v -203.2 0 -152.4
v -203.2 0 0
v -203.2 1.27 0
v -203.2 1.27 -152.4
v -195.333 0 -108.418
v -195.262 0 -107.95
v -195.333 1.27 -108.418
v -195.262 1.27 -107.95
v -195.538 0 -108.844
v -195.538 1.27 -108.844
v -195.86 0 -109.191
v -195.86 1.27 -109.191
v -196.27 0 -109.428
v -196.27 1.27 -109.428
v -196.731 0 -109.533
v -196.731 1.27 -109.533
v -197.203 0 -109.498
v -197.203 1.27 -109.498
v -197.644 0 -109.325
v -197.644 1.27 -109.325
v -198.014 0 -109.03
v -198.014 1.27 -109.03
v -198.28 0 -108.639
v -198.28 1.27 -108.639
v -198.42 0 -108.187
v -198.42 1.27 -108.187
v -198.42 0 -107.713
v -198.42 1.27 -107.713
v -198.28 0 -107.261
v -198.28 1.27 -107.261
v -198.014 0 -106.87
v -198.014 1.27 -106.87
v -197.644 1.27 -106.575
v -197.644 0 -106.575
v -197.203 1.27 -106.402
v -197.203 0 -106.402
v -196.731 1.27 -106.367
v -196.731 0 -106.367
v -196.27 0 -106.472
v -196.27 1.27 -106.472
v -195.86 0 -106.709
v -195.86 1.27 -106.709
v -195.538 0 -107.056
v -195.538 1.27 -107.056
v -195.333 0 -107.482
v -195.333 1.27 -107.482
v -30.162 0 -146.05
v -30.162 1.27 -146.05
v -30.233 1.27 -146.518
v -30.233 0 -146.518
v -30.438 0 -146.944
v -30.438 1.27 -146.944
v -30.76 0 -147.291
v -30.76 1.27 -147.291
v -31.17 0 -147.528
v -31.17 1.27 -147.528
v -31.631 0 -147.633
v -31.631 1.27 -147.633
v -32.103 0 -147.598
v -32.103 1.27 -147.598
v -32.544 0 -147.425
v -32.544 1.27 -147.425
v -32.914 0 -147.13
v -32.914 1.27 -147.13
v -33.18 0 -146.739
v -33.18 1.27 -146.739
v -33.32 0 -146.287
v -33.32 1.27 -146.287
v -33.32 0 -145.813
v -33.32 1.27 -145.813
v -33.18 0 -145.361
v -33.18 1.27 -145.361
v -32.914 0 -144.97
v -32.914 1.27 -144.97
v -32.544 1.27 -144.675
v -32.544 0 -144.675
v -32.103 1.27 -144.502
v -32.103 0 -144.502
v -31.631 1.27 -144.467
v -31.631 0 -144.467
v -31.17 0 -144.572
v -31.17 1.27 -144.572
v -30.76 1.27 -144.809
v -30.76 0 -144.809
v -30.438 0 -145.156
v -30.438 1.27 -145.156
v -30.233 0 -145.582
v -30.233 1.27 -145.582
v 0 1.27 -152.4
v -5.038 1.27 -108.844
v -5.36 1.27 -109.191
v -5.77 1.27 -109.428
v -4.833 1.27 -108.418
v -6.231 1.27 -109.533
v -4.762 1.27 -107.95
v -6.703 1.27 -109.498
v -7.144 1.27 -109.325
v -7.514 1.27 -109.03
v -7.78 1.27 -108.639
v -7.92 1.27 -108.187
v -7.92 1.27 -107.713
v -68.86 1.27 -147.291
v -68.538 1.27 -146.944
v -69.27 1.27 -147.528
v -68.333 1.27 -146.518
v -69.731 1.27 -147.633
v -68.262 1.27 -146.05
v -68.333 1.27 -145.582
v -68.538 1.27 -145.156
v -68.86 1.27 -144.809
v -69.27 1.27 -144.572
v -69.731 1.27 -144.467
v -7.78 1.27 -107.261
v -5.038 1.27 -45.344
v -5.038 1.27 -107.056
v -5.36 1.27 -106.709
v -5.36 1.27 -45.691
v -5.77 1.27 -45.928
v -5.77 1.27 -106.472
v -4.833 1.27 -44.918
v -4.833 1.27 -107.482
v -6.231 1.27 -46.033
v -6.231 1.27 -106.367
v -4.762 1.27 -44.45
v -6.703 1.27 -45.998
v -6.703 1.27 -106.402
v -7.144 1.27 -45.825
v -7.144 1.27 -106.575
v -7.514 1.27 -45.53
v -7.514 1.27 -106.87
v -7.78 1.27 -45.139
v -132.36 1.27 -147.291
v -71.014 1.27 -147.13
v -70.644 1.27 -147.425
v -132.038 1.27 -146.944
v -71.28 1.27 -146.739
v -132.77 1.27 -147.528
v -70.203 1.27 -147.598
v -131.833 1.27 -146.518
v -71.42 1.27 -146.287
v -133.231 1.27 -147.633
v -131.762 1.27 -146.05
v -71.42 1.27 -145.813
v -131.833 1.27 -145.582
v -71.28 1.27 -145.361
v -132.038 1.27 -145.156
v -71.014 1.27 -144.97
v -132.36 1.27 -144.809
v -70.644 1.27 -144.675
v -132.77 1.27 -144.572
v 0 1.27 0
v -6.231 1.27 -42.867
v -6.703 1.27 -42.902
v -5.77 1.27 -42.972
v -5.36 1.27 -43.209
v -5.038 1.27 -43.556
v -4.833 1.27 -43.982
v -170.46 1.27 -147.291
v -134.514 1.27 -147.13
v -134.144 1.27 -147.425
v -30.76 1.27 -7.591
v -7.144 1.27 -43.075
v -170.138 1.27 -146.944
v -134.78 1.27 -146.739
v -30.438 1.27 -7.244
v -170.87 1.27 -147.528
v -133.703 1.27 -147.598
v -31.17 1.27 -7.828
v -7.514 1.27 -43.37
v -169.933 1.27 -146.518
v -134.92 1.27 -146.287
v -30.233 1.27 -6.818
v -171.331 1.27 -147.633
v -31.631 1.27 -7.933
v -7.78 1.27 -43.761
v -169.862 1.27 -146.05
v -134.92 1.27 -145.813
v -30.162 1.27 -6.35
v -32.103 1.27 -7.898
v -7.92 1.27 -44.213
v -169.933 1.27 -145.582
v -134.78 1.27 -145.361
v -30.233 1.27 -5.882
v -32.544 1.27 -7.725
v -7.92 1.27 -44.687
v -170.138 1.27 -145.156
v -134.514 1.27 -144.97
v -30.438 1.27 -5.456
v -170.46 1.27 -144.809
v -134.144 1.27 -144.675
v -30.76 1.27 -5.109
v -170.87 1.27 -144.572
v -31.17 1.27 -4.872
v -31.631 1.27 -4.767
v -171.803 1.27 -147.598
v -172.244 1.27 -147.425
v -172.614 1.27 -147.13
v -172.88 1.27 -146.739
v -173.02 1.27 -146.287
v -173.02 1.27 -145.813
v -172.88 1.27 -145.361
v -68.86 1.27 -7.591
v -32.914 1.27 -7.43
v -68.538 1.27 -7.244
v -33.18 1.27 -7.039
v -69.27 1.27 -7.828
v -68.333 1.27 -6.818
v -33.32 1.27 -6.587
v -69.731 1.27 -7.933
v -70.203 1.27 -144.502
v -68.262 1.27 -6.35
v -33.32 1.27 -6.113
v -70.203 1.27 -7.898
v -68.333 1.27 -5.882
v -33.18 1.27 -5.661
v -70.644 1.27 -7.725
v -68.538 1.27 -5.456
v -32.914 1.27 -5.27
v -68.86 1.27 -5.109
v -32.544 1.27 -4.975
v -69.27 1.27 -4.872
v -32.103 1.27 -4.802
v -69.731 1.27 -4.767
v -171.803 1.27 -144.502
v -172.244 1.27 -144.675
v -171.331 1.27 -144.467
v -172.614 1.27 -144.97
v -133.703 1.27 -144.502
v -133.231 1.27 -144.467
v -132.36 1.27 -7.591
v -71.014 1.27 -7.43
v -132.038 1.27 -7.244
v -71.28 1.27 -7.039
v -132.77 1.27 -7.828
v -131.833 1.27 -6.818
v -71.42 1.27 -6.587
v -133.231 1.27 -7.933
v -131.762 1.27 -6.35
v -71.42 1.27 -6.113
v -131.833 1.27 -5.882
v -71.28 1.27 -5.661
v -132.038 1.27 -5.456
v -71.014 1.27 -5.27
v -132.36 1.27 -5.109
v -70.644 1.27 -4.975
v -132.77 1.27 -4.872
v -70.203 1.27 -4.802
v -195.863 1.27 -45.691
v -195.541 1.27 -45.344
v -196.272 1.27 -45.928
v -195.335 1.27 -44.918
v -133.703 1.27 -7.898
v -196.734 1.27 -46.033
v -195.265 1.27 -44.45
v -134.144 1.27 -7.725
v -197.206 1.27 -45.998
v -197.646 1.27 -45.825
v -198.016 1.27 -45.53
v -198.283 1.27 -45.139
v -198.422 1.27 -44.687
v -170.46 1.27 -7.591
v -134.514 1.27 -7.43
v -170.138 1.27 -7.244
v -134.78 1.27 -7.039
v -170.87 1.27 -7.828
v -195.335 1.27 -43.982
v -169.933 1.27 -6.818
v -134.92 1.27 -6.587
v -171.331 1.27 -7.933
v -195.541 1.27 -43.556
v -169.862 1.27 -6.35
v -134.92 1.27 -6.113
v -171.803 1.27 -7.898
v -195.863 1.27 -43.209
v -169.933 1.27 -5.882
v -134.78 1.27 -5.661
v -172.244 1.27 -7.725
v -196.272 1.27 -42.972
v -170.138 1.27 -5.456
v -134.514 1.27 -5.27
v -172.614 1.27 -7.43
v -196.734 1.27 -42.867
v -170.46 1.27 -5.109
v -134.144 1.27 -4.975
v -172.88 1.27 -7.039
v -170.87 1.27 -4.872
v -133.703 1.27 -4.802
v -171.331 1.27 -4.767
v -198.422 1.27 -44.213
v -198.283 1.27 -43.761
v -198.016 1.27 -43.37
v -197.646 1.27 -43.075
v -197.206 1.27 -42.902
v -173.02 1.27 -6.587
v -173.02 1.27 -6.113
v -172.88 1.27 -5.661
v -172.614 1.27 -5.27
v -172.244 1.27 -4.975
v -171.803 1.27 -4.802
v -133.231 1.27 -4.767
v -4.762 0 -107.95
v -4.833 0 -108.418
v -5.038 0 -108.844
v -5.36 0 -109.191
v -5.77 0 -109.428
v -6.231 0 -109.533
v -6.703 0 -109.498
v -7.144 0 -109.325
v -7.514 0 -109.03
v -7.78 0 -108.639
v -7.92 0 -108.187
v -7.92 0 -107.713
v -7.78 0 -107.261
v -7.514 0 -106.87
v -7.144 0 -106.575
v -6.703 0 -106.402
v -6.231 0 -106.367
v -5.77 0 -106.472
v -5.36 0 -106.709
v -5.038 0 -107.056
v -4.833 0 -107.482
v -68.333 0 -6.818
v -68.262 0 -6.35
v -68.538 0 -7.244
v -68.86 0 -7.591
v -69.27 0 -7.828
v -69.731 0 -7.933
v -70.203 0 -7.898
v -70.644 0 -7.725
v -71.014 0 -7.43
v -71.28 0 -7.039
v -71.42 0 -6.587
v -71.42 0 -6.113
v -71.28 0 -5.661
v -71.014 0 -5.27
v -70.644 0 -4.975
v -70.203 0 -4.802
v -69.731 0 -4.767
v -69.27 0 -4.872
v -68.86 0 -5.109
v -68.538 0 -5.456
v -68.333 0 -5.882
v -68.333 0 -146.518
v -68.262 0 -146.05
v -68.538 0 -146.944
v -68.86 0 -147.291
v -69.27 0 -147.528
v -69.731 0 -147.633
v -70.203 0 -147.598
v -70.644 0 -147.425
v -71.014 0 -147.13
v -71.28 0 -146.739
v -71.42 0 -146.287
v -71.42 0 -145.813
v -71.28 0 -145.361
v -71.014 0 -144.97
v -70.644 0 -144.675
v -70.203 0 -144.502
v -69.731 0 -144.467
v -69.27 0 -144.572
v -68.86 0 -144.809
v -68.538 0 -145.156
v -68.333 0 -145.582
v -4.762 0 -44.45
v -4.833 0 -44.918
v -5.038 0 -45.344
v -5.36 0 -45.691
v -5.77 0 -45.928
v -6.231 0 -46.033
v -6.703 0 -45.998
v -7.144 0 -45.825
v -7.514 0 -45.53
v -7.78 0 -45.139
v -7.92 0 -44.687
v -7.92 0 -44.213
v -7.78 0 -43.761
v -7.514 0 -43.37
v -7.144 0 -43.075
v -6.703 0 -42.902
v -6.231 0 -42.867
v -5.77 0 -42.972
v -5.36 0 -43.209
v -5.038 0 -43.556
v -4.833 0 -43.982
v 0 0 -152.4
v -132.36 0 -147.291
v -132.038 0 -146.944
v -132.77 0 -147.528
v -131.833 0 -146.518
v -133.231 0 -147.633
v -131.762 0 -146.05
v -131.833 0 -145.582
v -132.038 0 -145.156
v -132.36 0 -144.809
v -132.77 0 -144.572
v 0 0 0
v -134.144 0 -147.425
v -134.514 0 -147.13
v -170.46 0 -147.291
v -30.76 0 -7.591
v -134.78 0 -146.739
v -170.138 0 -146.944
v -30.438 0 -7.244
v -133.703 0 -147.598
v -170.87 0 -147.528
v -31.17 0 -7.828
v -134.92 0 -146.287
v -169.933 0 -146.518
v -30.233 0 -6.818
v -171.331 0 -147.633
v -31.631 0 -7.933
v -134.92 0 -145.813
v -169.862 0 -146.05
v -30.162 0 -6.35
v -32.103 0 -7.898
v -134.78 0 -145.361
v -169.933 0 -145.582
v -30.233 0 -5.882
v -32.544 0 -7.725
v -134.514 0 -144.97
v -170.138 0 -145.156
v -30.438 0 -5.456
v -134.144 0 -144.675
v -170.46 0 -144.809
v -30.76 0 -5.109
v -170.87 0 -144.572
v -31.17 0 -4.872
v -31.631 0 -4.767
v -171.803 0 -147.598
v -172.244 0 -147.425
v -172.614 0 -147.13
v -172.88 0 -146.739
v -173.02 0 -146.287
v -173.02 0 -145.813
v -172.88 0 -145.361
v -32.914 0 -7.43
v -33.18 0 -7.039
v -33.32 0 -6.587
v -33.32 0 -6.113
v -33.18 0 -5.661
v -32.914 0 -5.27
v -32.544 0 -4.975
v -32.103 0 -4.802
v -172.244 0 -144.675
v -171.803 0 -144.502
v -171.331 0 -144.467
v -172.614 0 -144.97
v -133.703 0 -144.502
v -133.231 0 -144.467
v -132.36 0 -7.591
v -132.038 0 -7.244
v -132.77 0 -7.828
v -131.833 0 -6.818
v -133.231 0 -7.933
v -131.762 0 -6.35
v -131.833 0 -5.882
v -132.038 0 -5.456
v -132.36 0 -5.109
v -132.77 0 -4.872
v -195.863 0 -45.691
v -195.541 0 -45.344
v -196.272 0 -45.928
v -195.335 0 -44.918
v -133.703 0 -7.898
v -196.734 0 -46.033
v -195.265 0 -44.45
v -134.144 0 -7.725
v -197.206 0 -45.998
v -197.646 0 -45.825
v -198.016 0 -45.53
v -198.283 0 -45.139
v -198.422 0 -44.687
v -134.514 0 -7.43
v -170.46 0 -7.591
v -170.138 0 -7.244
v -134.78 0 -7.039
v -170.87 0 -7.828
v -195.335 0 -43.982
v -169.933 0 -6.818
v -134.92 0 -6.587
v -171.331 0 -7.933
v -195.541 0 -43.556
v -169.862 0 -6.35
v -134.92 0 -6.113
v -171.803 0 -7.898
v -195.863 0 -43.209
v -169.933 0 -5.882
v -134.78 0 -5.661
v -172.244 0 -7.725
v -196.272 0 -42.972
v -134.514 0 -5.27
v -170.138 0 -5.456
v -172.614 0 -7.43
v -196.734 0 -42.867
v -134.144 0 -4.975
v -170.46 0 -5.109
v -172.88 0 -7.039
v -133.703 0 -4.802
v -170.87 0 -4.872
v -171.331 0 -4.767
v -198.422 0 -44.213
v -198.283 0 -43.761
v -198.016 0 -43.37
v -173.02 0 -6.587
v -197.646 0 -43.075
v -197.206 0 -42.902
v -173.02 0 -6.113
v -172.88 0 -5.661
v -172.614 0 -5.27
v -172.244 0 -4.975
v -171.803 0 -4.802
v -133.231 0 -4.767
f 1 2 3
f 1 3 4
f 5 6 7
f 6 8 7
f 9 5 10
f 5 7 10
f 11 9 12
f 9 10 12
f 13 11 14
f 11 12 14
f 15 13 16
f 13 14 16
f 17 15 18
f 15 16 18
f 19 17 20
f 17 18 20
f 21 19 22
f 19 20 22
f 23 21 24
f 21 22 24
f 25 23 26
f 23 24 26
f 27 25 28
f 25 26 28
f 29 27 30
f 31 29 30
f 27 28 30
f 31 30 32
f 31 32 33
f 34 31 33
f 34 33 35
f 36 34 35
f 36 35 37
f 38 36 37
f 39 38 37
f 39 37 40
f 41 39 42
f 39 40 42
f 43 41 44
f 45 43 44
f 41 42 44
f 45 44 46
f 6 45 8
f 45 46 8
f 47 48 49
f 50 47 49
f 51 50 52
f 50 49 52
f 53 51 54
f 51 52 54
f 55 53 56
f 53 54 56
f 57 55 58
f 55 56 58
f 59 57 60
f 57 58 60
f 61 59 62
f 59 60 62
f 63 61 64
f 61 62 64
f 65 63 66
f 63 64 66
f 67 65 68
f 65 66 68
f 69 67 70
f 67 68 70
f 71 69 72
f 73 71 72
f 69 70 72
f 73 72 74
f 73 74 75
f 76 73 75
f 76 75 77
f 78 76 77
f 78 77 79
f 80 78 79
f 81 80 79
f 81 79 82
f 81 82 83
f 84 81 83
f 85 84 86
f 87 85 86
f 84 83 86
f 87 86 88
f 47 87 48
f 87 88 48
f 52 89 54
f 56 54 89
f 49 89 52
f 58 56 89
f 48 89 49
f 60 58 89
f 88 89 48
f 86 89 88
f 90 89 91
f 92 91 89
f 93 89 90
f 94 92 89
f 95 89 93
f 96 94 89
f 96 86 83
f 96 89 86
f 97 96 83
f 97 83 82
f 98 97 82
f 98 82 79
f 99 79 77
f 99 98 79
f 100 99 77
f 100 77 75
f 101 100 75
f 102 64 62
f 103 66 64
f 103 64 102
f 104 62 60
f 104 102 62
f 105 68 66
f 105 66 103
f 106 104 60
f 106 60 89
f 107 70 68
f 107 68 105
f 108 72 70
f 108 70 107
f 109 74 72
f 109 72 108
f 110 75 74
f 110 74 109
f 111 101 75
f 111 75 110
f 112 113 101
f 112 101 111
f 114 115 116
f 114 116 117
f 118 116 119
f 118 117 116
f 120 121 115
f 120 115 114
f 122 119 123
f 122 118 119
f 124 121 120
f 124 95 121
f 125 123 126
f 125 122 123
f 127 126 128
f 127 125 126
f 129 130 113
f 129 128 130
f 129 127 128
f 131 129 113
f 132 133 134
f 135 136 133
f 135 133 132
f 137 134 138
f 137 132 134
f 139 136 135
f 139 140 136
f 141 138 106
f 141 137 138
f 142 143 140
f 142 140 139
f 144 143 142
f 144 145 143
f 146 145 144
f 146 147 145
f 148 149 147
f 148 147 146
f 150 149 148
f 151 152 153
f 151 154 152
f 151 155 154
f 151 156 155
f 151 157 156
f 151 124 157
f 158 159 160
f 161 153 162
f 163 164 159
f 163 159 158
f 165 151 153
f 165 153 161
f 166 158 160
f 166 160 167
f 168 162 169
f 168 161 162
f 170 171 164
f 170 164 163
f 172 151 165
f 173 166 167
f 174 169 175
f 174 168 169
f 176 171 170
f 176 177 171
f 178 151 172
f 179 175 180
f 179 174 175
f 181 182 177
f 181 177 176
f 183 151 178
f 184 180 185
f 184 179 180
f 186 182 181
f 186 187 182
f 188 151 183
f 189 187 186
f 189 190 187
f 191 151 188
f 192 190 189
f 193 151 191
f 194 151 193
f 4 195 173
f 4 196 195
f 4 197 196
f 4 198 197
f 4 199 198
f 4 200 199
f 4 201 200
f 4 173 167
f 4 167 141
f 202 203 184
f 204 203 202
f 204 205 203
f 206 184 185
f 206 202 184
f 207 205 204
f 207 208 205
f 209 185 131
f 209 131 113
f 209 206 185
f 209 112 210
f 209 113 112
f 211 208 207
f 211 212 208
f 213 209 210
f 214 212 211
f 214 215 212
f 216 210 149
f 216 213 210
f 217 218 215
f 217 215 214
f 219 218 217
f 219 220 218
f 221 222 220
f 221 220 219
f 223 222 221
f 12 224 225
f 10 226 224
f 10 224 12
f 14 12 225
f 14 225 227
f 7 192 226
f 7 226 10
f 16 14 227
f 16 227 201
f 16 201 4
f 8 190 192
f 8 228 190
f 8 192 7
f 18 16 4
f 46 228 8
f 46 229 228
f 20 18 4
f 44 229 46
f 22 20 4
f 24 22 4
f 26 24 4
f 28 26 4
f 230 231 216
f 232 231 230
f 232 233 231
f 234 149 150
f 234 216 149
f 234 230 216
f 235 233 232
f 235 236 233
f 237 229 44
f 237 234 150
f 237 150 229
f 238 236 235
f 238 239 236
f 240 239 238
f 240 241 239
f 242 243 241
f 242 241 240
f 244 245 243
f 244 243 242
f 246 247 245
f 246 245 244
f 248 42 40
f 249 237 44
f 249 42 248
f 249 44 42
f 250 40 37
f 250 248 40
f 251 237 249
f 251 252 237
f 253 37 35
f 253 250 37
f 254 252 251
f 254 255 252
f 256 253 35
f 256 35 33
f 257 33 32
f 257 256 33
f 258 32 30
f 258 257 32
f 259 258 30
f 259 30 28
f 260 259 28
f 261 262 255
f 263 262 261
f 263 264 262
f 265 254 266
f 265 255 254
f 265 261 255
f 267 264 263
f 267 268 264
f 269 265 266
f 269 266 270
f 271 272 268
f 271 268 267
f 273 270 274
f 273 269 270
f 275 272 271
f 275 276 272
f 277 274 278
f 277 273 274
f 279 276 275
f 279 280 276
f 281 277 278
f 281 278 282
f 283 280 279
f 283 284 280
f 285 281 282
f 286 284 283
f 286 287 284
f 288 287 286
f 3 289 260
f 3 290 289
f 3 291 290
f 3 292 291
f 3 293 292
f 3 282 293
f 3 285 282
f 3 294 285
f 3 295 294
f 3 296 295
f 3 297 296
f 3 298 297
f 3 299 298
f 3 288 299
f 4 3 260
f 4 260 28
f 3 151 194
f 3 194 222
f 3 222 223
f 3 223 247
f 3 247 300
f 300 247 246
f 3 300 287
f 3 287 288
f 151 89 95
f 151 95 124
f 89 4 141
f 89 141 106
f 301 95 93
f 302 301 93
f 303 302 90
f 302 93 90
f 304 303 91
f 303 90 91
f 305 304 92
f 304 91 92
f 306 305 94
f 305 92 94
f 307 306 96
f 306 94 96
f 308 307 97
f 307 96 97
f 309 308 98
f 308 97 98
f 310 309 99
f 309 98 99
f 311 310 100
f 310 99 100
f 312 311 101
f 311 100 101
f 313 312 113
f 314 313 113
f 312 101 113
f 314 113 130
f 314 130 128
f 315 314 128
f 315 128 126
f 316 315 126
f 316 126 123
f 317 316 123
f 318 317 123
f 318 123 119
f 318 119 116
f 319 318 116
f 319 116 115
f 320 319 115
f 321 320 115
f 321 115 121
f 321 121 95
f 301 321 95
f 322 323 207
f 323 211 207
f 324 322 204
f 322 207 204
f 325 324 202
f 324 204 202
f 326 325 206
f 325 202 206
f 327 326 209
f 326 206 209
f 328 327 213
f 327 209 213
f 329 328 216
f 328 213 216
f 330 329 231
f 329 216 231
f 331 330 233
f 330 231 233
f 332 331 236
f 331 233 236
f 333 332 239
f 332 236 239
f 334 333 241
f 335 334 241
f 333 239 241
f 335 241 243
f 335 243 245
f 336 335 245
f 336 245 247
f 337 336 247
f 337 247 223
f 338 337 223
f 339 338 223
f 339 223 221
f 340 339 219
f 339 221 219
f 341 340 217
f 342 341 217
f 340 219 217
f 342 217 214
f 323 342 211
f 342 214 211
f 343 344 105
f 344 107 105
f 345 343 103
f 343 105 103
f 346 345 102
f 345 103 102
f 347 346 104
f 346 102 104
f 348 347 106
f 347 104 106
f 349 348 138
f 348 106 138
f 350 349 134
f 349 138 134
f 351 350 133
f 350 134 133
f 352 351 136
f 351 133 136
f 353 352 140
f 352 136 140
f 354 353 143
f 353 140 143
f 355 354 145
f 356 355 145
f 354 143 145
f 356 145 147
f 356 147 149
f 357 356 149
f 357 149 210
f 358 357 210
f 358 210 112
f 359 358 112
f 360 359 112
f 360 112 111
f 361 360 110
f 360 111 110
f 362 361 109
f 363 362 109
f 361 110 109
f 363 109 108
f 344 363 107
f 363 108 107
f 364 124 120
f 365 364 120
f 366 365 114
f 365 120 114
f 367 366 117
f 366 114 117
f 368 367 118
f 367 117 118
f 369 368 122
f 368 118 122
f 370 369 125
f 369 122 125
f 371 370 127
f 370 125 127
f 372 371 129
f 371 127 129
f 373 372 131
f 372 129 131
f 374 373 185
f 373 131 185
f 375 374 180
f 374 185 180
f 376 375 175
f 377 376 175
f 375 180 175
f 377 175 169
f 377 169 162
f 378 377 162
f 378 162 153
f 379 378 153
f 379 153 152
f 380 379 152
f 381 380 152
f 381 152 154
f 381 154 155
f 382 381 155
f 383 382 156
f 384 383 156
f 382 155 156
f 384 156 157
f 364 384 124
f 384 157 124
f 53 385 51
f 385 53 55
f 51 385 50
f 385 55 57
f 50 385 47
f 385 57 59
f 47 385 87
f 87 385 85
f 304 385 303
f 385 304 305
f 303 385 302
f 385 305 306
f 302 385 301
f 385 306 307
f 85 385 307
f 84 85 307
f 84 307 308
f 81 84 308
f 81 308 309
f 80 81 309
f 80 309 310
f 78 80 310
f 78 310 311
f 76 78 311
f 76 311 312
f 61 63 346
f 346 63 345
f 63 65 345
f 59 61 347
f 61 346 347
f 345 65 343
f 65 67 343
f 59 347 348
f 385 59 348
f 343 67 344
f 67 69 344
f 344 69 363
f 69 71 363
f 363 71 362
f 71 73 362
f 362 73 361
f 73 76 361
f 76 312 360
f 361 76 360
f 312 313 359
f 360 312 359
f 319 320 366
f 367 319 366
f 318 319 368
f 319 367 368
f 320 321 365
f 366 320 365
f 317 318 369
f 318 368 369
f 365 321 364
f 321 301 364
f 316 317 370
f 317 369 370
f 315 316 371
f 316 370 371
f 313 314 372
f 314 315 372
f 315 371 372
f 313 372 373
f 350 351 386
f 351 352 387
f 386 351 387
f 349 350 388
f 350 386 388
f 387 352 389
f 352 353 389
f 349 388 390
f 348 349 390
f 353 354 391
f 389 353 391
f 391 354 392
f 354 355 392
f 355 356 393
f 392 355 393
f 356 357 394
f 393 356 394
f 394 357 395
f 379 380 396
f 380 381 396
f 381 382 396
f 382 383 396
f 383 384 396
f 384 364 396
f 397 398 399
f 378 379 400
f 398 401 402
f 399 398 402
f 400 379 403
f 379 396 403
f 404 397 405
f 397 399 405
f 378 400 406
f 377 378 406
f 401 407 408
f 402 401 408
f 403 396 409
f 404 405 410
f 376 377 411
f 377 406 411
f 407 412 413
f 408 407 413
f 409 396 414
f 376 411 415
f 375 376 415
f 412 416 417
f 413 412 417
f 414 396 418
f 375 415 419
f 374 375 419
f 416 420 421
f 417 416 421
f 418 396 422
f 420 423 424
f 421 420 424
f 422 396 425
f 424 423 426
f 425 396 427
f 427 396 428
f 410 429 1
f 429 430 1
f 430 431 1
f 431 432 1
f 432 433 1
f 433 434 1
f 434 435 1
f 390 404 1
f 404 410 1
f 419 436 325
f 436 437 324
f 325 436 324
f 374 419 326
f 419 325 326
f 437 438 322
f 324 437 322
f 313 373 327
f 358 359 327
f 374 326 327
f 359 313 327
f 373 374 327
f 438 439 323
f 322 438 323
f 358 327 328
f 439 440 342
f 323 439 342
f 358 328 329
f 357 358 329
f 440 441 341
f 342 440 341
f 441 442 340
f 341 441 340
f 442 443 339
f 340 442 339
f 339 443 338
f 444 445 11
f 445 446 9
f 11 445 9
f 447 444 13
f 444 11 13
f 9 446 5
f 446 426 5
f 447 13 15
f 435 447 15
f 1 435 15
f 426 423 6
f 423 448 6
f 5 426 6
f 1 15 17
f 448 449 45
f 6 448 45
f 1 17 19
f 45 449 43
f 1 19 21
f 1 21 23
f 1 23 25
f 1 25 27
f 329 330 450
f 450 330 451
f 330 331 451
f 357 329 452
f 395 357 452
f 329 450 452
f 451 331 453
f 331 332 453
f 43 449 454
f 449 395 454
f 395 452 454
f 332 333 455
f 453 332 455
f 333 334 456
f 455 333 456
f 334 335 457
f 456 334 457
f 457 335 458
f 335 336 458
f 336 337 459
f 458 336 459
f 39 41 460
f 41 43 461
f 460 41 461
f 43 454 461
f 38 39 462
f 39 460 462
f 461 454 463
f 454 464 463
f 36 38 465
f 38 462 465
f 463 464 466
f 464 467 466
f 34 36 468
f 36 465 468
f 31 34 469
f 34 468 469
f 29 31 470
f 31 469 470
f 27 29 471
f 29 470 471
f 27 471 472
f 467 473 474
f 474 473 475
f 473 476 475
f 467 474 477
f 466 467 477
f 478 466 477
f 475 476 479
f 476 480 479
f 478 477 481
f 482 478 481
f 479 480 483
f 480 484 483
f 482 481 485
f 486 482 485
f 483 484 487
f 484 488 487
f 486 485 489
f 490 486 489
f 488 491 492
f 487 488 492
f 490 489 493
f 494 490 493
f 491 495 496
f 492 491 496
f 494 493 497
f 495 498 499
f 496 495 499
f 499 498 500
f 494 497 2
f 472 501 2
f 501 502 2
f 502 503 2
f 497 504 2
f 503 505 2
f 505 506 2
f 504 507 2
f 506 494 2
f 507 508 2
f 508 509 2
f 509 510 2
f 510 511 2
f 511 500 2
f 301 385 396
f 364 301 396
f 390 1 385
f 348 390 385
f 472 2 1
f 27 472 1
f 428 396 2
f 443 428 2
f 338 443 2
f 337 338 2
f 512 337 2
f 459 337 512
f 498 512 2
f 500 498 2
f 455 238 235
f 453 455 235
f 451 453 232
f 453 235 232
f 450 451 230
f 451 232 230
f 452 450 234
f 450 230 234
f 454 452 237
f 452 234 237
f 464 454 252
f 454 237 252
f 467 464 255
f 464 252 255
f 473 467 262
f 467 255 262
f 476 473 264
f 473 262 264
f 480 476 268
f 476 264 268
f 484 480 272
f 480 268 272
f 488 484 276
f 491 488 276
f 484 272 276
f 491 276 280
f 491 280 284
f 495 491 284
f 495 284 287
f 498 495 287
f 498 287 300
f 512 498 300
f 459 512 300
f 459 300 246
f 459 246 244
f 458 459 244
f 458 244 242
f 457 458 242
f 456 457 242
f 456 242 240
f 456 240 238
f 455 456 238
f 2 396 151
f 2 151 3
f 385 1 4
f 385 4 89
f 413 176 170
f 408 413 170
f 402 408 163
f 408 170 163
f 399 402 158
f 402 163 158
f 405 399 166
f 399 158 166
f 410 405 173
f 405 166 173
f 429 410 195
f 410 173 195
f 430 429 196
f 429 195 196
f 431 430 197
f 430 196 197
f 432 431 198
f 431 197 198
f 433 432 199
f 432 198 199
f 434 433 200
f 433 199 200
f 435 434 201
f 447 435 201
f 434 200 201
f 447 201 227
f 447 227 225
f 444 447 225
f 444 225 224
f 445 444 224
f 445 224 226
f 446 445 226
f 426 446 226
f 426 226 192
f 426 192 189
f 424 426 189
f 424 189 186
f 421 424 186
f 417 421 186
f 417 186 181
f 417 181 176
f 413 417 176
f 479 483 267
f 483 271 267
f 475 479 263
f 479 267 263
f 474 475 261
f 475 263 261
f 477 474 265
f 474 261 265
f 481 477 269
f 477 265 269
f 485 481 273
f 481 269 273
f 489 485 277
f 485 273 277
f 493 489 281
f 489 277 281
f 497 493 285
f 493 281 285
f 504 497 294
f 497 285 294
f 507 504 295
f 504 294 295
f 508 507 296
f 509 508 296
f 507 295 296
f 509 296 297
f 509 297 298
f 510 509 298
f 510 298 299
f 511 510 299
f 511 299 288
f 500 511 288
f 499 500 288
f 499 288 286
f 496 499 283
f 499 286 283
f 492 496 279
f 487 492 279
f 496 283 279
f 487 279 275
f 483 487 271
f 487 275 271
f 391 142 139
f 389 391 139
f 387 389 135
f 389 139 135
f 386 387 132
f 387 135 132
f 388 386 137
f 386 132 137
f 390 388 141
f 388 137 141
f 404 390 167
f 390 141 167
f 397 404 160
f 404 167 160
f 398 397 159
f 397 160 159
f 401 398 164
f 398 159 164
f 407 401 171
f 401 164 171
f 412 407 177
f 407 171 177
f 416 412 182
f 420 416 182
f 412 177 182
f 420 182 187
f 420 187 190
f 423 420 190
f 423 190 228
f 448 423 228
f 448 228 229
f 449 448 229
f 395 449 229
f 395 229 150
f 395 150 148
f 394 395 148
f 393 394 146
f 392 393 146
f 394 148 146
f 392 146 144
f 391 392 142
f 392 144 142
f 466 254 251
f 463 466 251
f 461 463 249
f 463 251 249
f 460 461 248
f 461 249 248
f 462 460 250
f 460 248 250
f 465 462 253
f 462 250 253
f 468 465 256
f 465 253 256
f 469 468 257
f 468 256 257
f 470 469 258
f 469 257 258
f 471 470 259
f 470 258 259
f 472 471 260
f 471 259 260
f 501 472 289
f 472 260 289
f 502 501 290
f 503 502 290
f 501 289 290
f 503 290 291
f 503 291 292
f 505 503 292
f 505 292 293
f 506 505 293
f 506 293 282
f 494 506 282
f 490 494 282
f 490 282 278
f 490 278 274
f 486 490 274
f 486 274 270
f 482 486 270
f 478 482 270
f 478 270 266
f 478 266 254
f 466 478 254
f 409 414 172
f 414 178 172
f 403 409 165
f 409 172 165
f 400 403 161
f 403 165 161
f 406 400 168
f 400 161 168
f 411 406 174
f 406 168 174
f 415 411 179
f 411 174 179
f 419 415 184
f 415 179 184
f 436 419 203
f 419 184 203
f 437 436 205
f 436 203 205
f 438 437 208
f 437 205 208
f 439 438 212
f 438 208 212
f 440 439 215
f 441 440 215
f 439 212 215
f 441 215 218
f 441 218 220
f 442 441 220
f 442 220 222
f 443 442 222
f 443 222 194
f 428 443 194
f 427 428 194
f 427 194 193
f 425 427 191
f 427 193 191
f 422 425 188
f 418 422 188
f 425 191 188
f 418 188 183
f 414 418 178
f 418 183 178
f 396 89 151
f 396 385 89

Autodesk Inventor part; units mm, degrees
ref_plane "YZ Plane" through (0, 0, 0) normal (1, 0, 0) x (0, 1, 0)
ref_plane "XZ Plane" through (0, 0, 0) normal (0, 1, 0) x (-1, 0, 0)
ref_plane "XY Plane" through (0, 0, 0) normal (0, 0, 1) x (1, 0, 0)
sketch "Sketch1" plane through (0, 0, 0) normal (0, 1, 0) x (-1, 0, 0)
  line L0 (0, 0) -> (203.2, 0)
  line L1 (203.2, 0) -> (203.2, -152.4)
  line L2 (203.2, -152.4) -> (0, -152.4)
  line L3 (0, -152.4) -> (0, 0)
  dimension "d0" = 203.2
  dimension "d1" = 152.4
extrude "Extrusion1" add sketch "Sketch1" along normal blind 1.27
sketch "Sketch3" plane through (0, 1.27, 0) normal (0, 1, 0) x (1, 0, 0)
  circle A0 centre (-171.45, 6.35) radius 1.5875
  circle A1 centre (-196.8524, 44.45) radius 1.5875
  circle A2 centre (-31.75, 6.35) radius 1.5875
  circle A3 centre (-6.35, 44.45) radius 1.5875
  circle A4 centre (-6.35, 107.95) radius 1.5875
  circle A5 centre (-31.75, 146.05) radius 1.5875
  circle A6 centre (-171.45, 146.05) radius 1.5875
  circle A7 centre (-196.85, 107.95) radius 1.5875
  line L0 (-203.2, 152.4) -> (-203.2, 0) projected
  line L1 (0, 152.4) -> (-203.2, 152.4) projected
  line L2 (0, 0) -> (0, 152.4) projected
  line L3 (-203.2, 0) -> (0, 0) projected
  circle A8 centre (-133.35, 6.35) radius 1.5875
  circle A9 centre (-69.85, 6.35) radius 1.5875
  circle A10 centre (-69.85, 146.05) radius 1.5875
  circle A11 centre (-133.35, 146.05) radius 1.5875
  dimension "d36" = 3.175
  dimension "d37" = 3.175
  dimension "d38" = 3.175
  dimension "d39" = 3.175
  dimension "d40" = 3.175
  dimension "d41" = 3.175
  dimension "d42" = 3.175
  dimension "d43" = 3.175
  dimension "d45" = 6.35
  dimension "d46" = 44.45
  dimension "d47" = 6.35
  dimension "d48" = 31.75
  dimension "d49" = 31.75
  dimension "d50" = 6.35
  dimension "d51" = 44.45
  dimension "d52" = 6.35
  dimension "d53" = 44.45
  dimension "d54" = 6.35
  dimension "d55" = 31.75
  dimension "d56" = 6.35
  dimension "d57" = 31.75
  dimension "d58" = 6.3476
  dimension "d59" = 44.45
  dimension "d62" = 203.2
  dimension "d63" = 152.4
  dimension "d64" = 69.85
  dimension "d65" = 3.175
  dimension "d66" = 6.35
  dimension "d67" = 69.85
  dimension "d68" = 3.175
  dimension "d69" = 6.35
  dimension "d70" = 3.175
  dimension "d71" = 6.35
  dimension "d72" = 69.85
  dimension "d73" = 3.175
  dimension "d74" = 6.35
  dimension "d75" = 69.85
extrude "Extrusion2" cut sketch "Sketch3" against normal blind 25.4 contours A0 | A1 | A2 | A3 | A4 | A5 | A6 | A7 | A8 | A9 | A10 | A11
properties part number "000103"
